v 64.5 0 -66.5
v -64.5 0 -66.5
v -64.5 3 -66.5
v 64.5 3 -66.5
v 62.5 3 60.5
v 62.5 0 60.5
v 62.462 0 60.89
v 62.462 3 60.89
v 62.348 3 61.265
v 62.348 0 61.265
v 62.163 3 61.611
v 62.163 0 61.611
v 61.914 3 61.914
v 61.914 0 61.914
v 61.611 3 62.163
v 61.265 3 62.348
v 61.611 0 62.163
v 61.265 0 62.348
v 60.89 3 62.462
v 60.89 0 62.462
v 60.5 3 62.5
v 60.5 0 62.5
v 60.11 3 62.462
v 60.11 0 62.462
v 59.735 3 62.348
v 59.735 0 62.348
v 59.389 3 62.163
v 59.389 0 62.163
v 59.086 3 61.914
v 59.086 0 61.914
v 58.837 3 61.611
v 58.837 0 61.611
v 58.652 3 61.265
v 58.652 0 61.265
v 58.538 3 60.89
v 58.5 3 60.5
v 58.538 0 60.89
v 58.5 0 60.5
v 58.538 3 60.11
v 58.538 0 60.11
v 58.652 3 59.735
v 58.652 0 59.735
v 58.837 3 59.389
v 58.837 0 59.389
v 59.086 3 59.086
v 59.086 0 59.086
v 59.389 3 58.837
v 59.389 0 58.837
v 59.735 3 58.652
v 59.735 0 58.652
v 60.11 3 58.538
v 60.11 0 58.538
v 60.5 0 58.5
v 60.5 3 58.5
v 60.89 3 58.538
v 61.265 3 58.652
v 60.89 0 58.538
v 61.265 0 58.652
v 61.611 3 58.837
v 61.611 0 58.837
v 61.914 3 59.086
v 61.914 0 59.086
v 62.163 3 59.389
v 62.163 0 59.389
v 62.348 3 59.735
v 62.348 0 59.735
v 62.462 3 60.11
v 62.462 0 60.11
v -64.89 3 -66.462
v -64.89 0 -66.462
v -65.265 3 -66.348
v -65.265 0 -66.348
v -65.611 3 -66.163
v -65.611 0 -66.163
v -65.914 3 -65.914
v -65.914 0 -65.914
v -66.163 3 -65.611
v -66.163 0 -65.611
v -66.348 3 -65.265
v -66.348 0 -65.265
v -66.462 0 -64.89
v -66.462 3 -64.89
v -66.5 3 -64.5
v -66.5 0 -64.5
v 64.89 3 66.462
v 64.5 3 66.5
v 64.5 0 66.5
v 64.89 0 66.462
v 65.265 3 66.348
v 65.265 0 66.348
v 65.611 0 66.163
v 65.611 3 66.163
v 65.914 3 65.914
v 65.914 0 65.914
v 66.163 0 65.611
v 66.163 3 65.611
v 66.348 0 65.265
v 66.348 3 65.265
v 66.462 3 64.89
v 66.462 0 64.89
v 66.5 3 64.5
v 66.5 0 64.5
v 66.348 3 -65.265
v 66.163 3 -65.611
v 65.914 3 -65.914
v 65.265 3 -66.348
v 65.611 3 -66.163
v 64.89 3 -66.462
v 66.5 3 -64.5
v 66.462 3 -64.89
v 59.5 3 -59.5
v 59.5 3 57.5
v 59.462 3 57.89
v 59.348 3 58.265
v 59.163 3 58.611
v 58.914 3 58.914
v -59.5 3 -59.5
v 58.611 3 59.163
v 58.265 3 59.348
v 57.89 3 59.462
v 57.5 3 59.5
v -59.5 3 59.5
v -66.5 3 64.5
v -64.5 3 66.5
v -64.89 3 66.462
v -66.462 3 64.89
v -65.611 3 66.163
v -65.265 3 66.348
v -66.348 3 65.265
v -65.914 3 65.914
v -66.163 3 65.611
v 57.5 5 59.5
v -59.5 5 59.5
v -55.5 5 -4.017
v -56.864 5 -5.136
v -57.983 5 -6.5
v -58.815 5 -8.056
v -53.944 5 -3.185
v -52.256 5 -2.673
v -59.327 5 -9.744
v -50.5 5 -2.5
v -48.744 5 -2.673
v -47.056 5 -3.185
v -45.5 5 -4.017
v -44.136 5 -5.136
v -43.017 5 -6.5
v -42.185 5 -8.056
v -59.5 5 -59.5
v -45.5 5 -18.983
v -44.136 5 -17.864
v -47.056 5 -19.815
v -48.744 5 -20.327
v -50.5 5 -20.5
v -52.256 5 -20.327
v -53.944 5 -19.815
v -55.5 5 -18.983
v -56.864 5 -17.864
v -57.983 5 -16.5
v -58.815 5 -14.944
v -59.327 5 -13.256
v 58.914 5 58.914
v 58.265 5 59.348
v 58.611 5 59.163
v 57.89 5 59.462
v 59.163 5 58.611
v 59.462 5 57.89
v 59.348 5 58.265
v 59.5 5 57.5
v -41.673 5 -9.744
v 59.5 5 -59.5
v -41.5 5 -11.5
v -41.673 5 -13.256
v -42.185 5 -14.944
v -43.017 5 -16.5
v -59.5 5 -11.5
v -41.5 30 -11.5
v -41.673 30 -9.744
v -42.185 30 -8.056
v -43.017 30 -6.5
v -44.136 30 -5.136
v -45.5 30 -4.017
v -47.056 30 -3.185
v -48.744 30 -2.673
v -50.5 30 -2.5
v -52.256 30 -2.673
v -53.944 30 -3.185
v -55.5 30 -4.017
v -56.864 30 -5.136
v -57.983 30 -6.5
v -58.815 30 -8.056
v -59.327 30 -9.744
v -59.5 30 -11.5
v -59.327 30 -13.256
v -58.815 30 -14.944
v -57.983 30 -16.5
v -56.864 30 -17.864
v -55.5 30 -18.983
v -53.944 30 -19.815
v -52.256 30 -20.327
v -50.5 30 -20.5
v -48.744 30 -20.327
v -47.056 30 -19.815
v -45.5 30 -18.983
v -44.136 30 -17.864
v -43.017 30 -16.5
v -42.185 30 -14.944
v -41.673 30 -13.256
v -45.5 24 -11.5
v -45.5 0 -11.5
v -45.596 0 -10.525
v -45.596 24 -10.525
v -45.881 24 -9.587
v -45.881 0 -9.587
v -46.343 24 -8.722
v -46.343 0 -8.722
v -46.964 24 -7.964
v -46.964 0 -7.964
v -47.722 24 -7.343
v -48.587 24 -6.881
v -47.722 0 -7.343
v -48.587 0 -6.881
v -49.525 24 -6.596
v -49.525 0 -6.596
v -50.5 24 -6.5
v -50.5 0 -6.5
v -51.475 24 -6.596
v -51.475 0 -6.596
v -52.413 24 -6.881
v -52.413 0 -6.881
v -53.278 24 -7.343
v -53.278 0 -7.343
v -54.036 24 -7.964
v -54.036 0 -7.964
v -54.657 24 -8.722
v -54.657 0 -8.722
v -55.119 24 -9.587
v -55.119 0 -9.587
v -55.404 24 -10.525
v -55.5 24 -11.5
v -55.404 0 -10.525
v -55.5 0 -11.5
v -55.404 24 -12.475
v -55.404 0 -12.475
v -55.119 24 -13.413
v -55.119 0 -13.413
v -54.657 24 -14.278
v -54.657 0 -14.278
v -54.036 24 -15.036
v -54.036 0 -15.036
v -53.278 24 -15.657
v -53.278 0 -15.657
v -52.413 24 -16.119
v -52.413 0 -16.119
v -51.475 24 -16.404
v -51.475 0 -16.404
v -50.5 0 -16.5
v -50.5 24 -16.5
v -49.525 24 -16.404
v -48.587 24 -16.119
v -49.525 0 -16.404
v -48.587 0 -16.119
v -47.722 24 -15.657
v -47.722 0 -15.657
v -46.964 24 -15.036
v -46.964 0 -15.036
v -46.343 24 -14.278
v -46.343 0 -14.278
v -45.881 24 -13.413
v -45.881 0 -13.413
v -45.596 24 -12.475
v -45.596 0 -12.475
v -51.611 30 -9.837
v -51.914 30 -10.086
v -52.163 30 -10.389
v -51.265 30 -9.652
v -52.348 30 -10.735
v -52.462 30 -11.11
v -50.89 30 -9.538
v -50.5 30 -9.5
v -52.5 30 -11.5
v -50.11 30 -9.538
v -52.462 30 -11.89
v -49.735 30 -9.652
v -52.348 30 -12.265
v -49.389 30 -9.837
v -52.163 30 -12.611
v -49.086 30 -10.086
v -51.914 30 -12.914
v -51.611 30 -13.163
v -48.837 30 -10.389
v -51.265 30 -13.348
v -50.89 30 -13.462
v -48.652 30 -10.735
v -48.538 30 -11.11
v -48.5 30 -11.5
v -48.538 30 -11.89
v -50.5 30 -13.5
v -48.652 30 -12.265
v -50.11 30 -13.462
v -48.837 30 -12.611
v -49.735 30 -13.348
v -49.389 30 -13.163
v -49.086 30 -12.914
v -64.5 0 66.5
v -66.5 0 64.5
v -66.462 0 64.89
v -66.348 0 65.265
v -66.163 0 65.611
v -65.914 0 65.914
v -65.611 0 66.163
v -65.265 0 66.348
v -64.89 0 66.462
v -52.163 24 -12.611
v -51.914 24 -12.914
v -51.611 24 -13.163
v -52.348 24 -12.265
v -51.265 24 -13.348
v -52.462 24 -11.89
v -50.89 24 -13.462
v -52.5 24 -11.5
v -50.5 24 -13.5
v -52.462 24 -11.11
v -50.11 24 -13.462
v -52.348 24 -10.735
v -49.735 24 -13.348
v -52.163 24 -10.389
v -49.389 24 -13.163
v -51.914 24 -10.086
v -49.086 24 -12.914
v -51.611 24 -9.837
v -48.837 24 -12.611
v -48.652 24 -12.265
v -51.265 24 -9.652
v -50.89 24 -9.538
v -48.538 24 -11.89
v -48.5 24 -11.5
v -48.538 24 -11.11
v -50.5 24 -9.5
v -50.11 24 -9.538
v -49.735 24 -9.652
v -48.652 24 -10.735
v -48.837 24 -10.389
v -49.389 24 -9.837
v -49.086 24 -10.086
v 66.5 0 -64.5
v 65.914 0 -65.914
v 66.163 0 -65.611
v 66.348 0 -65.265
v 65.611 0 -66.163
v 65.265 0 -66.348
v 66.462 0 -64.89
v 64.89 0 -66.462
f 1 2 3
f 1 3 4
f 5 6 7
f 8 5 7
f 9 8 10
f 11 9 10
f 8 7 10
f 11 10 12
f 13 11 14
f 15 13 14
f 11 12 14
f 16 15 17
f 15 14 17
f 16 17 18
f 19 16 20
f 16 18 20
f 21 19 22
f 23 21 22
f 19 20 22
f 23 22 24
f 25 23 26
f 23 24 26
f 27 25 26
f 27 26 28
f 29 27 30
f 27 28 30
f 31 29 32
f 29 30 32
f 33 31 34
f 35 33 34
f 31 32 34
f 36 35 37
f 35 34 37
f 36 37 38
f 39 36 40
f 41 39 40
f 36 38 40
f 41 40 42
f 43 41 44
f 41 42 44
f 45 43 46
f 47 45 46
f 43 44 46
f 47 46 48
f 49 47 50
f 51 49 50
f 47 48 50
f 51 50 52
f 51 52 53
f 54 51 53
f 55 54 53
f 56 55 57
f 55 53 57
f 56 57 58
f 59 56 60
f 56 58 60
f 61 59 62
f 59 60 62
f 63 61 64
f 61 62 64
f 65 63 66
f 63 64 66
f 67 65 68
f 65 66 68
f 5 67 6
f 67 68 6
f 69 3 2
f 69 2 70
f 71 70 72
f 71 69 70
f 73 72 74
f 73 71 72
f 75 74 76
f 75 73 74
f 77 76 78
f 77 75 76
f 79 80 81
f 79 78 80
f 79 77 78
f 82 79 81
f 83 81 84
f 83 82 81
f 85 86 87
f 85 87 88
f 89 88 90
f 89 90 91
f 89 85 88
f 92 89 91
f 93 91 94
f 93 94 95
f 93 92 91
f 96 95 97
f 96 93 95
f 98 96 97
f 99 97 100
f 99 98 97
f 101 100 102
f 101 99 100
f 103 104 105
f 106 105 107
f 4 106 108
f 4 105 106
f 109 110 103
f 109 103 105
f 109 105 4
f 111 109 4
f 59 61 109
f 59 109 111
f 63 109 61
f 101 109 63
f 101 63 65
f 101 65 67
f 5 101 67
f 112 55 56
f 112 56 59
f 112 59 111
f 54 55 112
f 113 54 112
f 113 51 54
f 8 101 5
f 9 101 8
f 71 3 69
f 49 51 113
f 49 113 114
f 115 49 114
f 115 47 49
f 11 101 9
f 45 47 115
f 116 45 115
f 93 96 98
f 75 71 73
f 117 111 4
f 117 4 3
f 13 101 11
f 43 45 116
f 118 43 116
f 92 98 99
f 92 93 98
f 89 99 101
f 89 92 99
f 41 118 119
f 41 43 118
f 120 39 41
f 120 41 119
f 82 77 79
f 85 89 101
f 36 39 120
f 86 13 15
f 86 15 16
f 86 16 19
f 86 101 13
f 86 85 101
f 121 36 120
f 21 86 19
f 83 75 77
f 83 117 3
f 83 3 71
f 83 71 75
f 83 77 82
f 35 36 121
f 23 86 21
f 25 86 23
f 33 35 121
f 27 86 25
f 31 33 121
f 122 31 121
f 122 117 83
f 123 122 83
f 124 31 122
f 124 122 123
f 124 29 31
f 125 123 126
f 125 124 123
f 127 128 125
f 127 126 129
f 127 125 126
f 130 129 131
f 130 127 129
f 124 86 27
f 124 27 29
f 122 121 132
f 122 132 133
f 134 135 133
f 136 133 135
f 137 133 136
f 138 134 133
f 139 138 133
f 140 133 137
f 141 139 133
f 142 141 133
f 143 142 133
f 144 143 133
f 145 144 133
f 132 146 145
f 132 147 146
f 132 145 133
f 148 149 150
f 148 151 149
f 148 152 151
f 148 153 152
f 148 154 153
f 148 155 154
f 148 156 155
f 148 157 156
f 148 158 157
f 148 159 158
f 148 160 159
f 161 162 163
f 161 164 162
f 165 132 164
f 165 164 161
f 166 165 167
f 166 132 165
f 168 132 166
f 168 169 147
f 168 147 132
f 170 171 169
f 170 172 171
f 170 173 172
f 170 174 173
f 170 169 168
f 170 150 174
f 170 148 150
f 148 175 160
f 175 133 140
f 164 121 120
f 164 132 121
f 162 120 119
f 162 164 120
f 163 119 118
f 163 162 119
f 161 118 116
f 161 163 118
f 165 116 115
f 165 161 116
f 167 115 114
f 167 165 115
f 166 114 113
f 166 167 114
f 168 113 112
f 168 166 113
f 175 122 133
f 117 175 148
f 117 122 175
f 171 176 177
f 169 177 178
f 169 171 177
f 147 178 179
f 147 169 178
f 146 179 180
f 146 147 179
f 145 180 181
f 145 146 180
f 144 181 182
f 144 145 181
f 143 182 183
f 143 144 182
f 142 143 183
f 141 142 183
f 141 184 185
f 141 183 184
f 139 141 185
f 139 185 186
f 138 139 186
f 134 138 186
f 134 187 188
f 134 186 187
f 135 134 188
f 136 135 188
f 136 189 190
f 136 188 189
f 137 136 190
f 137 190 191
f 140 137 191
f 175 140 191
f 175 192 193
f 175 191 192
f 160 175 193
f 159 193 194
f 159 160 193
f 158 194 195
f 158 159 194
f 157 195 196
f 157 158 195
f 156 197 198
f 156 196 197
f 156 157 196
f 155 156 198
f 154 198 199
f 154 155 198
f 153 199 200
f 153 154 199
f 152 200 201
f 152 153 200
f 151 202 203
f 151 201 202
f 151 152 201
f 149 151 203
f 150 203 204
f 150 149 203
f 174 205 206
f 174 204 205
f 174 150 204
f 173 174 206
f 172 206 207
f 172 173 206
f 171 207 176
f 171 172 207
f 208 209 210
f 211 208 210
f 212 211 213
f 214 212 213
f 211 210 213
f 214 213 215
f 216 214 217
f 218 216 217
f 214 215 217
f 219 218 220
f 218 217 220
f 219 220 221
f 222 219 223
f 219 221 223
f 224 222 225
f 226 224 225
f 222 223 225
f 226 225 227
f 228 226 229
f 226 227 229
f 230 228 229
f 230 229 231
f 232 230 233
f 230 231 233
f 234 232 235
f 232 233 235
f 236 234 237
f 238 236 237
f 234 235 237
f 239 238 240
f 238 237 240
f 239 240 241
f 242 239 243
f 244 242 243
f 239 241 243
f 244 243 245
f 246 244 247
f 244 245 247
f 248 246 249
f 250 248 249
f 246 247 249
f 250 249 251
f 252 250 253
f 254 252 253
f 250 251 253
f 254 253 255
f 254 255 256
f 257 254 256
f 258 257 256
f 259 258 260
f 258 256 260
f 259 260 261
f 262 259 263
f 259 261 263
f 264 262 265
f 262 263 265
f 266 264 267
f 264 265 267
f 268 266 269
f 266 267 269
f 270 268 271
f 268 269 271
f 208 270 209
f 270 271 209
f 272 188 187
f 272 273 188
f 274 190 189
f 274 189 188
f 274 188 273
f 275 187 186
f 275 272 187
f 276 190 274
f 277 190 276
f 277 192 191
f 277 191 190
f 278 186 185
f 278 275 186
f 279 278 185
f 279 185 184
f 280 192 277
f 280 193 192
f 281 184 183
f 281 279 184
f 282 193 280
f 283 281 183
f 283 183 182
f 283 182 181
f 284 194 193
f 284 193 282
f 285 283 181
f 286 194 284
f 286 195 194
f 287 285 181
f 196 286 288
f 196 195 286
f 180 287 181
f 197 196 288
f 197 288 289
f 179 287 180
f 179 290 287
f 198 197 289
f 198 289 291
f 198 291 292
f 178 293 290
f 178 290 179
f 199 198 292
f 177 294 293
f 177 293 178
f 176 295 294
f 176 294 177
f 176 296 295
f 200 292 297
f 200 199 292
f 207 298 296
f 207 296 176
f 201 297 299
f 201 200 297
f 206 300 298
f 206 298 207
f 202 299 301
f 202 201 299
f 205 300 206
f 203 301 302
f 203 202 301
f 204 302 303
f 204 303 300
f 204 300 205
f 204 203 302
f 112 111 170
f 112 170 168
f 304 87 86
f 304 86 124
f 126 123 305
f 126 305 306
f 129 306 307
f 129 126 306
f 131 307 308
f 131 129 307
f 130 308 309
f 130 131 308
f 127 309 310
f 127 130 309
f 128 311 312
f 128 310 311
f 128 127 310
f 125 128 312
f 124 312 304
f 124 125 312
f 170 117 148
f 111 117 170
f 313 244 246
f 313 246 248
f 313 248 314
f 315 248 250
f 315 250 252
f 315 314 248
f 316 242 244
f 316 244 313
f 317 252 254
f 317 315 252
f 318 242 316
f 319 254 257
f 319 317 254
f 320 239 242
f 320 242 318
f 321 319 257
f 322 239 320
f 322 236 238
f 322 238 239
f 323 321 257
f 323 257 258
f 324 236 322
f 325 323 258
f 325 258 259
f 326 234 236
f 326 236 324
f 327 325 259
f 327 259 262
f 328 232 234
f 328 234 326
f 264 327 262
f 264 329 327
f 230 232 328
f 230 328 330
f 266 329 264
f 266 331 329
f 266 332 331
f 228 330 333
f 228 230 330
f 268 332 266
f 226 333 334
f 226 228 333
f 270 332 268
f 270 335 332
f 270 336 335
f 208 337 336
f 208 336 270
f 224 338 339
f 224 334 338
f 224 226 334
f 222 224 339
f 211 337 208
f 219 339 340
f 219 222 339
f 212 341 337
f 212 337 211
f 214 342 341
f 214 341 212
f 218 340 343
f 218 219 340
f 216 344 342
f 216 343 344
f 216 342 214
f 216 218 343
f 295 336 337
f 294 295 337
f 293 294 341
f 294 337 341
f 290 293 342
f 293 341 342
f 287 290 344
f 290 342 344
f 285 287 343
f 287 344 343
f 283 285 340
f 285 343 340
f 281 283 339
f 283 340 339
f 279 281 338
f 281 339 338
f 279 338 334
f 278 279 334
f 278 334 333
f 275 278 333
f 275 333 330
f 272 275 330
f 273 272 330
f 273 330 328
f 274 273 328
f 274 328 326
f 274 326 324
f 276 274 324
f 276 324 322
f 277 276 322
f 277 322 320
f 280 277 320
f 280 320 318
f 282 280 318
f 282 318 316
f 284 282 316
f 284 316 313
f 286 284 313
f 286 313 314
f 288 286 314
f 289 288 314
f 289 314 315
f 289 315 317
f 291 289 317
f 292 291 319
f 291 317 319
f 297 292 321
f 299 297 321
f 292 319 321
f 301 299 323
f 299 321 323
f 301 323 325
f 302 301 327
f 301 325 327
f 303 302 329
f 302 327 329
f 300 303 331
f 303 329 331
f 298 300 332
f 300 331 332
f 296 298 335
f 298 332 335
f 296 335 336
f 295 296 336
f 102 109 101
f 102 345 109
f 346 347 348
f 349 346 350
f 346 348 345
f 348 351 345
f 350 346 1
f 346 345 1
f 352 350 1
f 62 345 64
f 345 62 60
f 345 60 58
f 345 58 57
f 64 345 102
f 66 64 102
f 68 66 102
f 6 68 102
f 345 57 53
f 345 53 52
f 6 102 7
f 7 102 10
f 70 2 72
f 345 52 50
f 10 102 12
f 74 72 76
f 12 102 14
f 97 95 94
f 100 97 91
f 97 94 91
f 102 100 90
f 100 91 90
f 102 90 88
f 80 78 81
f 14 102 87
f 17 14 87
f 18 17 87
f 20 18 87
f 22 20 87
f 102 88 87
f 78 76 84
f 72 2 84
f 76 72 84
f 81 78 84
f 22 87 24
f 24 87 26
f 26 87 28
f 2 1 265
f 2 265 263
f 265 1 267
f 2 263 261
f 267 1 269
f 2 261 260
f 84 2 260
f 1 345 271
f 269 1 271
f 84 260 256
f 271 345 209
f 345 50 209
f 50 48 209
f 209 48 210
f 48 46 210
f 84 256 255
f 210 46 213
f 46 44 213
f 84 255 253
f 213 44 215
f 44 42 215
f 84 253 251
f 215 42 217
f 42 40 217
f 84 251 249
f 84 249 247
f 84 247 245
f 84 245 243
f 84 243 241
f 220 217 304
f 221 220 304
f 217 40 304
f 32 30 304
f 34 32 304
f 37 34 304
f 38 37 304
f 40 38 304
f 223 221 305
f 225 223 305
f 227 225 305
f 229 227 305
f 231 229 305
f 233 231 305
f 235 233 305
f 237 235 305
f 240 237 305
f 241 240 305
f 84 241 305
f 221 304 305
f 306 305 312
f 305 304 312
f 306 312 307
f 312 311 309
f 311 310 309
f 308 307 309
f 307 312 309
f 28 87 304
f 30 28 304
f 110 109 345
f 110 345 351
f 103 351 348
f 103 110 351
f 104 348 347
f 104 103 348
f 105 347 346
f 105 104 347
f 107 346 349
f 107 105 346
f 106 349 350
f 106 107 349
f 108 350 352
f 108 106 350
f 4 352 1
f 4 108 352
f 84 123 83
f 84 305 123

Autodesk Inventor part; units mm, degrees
ref_plane "YZ Plane" through (0, 0, 0) normal (1, 0, 0) x (0, 1, 0)
ref_plane "XZ Plane" through (0, 0, 0) normal (0, 1, 0) x (-1, 0, 0)
ref_plane "XY Plane" through (0, 0, 0) normal (0, 0, 1) x (1, 0, 0)
sketch "Esboço1" plane through (0, 0, 0) normal (0, 1, 0) x (-1, 0, 0)
  line L0 (-66.5, 66.5) -> (66.5, 66.5)
  line L1 (66.5, 66.5) -> (66.5, -66.5)
  line L2 (66.5, -66.5) -> (-66.5, -66.5)
  line L3 (-66.5, -66.5) -> (-66.5, 66.5)
  line L4 (-66.5, 66.5) -> (66.5, -66.5) construction
  line L5 (66.5, 66.5) -> (-66.5, -66.5) construction
  point P0 (0, 0)
  dimension "d0" = 133
  dimension "d1" = 133
extrude "Extrusão1" add sketch "Esboço1" along normal blind 3
sketch "Esboço2" plane through (0, 3, 0) normal (0, 1, 0) x (1, 0, 0)
  line L0 (59.5, -59.5) -> (-59.5, -59.5)
  line L1 (-59.5, -59.5) -> (-59.5, 59.5)
  line L2 (-59.5, 59.5) -> (59.5, 59.5)
  line L3 (59.5, 59.5) -> (59.5, -59.5)
  line L4 (59.5, -59.5) -> (-59.5, 59.5) construction
  line L5 (-59.5, -59.5) -> (59.5, 59.5) construction
  line L6 (-66.5, 66.5) -> (-66.5, -66.5) projected
  line L7 (66.5, 66.5) -> (-66.5, 66.5) projected
  point P0 (0, 0)
  dimension "d4" = 7
  dimension "d5" = 7
extrude "Extrusão2" add sketch "Esboço2" along normal blind 2
sketch "Esboço3" plane through (0, 5, 0) normal (0, 1, 0) x (1, 0, 0)
  circle A0 centre (-50.5, 11.5) radius 9
  line L0 (-66.5, -66.5) -> (66.5, -66.5) projected
  line L1 (-66.5, 66.5) -> (-66.5, -66.5) projected
  line L2 (66.5, 66.5) -> (-66.5, 66.5) projected
  point P0 (0, 0)
  dimension "d8" = 18
  dimension "d10" = 16
  dimension "d20" = 55
extrude "Extrusão3" add sketch "Esboço3" along normal blind 25
sketch "Esboço4" plane through (0, 0, 0) normal (0, -1, 0) x (1, 0, 0)
  circle A0 centre (-50.5, -11.5) radius 9 projected
  circle A1 centre (-50.5, -11.5) radius 2
  point P0 (0, 0)
  dimension "d13" = 4
extrude "Extrusão4" cut sketch "Esboço4" against normal blind 31.25 contours A1
sketch "Esboço5" plane through (0, 0, 0) normal (0, -1, 0) x (1, 0, 0)
  circle A0 centre (-50.5, -11.5) radius 2 projected
  circle A1 centre (-50.5, -11.5) radius 5
  point P0 (0, 0)
  dimension "d16" = 10
extrude "Extrusão5" cut sketch "Esboço5" against normal blind 24
fillet "Arredondamento1" radius 2 4 edges at (-66.5, 1.5, -66.5) (66.5, 1.5, -66.5) (66.5, 1.5, 66.5) (-66.5, 1.5, 66.5)
sketch "Esboço6" plane through (0, 0, 0) normal (0, -1, 0) x (1, 0, 0)
  circle A0 centre (60.5, 60.5) radius 2
  line L0 (-64.5, 66.5) -> (64.5, 66.5) projected
  line L1 (66.5, 64.5) -> (66.5, -64.5) projected
  point P0 (0, 0)
  dimension "d21" = 4
  dimension "d22" = 6
  dimension "d23" = 6
fillet "Arredondamento2" radius 2 1 edges at (59.5, 4, 59.5)
extrude "Extrusão6" cut sketch "Esboço6" against normal blind 10
properties part number "tampa caixa armazenamneto"
